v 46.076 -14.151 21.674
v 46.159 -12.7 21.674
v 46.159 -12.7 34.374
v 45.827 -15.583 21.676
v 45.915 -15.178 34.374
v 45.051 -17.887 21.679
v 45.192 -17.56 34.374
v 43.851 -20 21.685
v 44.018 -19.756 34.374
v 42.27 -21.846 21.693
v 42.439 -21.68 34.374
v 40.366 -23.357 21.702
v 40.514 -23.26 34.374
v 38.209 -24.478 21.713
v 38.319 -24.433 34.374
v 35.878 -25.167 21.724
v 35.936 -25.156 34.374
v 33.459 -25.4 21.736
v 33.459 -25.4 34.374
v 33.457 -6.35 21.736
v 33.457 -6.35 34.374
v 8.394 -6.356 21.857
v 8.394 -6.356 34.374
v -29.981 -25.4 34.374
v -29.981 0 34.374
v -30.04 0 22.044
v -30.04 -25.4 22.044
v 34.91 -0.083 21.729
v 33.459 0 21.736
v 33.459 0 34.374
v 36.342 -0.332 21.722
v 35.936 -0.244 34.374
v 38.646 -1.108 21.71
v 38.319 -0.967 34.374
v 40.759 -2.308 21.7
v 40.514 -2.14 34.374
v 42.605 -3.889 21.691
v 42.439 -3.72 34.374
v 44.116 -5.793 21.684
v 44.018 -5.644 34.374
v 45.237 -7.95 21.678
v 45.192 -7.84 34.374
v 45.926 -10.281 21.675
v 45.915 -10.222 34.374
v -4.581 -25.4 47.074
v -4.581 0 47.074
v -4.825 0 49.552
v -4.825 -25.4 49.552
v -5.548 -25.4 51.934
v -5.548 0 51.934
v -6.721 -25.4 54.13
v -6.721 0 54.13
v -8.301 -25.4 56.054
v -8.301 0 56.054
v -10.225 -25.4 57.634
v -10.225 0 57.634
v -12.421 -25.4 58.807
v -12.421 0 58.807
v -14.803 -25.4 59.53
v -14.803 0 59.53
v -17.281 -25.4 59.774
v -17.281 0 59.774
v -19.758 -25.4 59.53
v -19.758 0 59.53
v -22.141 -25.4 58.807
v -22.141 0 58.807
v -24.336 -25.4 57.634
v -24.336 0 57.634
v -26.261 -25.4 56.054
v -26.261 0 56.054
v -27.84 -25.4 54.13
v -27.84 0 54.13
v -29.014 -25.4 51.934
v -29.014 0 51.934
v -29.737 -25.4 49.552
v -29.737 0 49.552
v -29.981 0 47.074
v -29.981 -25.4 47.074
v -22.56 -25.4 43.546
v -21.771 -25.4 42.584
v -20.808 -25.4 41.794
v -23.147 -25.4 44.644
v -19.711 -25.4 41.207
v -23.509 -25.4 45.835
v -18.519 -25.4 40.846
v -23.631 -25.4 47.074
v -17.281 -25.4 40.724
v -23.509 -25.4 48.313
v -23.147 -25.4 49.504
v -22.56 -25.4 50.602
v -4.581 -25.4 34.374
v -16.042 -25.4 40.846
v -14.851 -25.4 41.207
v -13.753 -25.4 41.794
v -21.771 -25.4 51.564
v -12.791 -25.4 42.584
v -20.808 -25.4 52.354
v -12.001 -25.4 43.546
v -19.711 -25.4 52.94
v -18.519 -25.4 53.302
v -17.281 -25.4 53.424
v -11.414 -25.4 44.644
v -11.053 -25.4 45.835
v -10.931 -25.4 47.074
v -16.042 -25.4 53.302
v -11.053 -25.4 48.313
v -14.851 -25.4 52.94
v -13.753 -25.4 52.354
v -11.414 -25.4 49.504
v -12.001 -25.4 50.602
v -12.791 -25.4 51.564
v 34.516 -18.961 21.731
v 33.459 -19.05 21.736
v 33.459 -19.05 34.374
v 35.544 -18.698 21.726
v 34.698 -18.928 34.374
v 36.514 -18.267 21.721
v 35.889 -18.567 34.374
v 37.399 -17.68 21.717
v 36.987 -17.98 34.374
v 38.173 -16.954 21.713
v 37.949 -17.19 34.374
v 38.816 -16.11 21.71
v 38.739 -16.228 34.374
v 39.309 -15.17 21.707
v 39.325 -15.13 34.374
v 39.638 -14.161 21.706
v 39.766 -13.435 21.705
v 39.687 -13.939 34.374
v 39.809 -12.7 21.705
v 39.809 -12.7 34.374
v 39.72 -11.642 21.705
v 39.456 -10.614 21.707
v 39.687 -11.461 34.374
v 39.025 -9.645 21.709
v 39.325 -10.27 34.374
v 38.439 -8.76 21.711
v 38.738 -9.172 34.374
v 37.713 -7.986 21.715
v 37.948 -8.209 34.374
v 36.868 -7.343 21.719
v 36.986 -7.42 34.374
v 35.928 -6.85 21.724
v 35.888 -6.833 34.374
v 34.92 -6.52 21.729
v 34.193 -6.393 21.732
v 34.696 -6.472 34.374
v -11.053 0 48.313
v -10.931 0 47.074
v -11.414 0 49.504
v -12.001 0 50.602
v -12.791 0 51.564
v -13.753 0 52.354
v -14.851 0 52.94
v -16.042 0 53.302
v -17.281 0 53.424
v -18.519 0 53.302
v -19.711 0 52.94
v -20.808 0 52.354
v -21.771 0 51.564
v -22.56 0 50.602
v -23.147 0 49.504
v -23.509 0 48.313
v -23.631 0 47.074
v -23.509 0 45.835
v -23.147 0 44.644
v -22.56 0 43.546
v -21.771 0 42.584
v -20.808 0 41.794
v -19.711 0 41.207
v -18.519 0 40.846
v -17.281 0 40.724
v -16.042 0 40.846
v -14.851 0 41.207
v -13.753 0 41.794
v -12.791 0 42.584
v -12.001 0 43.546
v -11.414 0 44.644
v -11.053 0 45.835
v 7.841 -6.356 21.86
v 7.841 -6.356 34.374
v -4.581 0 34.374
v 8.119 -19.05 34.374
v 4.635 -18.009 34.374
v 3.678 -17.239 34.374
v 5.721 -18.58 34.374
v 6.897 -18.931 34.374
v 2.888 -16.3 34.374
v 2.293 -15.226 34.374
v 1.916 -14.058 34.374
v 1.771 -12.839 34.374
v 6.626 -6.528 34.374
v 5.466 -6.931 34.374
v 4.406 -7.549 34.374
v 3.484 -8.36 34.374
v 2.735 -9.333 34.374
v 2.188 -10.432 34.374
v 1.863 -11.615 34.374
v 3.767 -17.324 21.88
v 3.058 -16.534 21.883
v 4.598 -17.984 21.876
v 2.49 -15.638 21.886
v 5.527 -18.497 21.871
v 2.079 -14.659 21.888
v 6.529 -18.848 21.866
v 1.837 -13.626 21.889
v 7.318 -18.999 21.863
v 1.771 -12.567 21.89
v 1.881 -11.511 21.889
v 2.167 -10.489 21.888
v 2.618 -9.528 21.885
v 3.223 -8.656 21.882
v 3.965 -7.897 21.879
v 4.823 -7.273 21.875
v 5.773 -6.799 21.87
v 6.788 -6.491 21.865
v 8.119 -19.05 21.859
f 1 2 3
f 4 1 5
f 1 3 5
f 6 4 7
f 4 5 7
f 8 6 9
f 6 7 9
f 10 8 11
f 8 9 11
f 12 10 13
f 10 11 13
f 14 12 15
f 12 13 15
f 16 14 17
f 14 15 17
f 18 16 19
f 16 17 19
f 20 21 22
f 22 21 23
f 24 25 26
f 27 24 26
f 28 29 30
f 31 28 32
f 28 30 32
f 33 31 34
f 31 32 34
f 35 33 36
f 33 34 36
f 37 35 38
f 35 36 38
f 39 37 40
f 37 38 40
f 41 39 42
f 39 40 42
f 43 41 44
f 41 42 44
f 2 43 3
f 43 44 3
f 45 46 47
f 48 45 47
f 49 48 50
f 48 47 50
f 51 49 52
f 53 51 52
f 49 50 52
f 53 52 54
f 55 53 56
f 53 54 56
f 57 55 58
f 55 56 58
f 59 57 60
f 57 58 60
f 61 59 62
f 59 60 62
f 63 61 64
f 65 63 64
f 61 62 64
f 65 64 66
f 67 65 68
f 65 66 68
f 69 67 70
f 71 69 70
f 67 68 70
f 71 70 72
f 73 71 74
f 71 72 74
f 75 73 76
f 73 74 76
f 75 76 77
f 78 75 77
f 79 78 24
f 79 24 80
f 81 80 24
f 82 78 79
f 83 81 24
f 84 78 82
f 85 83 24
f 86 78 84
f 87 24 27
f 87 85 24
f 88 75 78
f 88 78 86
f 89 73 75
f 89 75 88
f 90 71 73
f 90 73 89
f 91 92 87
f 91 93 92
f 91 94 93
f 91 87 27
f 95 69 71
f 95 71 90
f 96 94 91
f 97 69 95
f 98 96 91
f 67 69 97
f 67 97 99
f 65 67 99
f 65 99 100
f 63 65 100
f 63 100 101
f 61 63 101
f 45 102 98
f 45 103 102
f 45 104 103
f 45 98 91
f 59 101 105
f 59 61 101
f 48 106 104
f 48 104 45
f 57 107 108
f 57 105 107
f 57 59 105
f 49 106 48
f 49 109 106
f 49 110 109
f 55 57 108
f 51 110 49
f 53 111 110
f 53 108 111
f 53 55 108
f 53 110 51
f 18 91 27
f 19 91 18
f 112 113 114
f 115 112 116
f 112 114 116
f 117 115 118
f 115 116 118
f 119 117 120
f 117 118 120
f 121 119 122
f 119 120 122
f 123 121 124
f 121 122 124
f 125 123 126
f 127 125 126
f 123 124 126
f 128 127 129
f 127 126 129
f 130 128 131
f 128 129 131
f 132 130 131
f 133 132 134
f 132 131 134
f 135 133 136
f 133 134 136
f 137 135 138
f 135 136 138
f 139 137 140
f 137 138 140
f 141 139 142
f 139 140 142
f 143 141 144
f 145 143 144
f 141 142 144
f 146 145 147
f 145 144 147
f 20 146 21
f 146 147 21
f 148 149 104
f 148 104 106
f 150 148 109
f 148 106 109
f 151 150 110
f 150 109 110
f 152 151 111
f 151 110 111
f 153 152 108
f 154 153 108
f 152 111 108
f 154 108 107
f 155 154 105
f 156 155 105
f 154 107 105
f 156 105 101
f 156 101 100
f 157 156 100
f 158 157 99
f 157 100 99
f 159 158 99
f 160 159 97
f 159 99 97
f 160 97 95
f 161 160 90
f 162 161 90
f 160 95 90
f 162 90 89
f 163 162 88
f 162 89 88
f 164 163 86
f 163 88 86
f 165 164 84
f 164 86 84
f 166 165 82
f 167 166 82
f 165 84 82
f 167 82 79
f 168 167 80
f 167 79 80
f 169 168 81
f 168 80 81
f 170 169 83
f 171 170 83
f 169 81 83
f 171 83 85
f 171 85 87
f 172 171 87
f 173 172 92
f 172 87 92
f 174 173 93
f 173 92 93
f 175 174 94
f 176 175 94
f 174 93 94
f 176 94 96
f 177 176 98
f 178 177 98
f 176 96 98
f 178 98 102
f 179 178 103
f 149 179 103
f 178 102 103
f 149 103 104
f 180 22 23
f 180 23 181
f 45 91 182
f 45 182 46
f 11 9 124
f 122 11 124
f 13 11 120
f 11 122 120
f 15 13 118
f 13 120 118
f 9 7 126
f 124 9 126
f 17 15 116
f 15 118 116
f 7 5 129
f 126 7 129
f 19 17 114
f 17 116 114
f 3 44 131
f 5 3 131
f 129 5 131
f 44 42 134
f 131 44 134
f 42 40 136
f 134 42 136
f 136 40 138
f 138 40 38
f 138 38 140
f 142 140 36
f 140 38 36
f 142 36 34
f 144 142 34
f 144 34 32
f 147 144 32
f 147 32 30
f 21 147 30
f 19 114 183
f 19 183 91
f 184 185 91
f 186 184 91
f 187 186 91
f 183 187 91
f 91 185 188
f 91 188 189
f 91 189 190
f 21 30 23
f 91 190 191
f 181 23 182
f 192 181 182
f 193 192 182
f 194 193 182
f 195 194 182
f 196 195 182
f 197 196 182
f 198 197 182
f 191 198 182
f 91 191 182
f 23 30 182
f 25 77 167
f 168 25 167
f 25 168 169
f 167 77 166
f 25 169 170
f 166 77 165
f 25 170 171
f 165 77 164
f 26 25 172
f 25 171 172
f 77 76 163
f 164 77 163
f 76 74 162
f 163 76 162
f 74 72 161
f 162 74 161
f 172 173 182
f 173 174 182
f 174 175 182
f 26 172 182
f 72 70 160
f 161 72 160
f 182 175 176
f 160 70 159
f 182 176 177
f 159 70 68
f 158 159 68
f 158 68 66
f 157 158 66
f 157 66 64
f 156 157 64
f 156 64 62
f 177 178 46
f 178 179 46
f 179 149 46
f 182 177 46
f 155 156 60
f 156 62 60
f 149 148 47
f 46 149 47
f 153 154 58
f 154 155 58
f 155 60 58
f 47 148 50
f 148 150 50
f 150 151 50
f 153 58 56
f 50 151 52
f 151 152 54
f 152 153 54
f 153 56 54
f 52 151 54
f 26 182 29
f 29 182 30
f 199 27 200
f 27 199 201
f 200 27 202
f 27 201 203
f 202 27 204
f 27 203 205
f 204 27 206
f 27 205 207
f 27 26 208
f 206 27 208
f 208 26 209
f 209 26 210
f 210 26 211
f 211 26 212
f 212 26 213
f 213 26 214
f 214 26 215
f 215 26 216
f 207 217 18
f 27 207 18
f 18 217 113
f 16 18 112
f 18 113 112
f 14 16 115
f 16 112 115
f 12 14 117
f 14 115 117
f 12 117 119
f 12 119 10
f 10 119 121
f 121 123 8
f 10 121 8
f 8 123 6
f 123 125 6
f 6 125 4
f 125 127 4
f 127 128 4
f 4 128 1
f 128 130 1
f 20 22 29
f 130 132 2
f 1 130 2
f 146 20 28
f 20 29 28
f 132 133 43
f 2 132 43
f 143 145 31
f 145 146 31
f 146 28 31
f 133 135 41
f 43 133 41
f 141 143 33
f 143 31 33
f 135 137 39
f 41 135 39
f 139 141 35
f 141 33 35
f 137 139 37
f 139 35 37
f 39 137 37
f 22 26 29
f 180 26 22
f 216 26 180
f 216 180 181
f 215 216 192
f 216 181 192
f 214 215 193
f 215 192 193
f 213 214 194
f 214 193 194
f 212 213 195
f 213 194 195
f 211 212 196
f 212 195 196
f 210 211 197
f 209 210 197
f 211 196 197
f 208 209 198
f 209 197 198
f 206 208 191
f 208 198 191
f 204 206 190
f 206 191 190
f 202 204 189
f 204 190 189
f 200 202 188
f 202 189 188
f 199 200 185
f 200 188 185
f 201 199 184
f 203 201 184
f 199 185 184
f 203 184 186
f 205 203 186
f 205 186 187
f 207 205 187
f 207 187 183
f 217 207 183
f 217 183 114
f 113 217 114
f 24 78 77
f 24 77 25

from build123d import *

# Parameters (mm, degrees)
F1_DEPTH = 25.4
F2_R     = 6.3498502592
F3_DEPTH = 25.4
F5_DEPTH = 12.7
F7_DEPTH = 25.4


with BuildPart() as f1:
    # F0 (on Front) → F1 (new body)
    with BuildSketch(Plane.XZ):
        with BuildLine():
            Line((-29.9805339301, 47.0739776071), (-29.9805339301, 34.3739776071))
            Line((-29.9805339301, 34.3739776071), (-30.0404094228, 22.0440076031))
            Line((-30.0404094228, 22.0440076031), (46.1586921323, 21.6739776071))
            Line((46.1586921323, 21.6739776071), (46.1586921323, 34.3739776071))
            Line((46.1586921323, 34.3739776071), (-4.5808334117, 34.3739776071))
            Line((-4.5808334117, 34.3739776071), (-4.5808334117, 47.0739776071))
            ThreePointArc((-4.5808334117, 47.0739776071), (-17.2806836709, 59.7738278663), (-29.9805339301, 47.0739776071))
        make_face()
    extrude(amount=F1_DEPTH)

    # F2 (on face) → F3 (cut)
    with BuildSketch(Plane.XZ.offset(25.4)):
        with Locations((-17.2806836709, 47.0739776071)):
            Circle(F2_R)
    extrude(amount=-F3_DEPTH, mode=Mode.SUBTRACT)

    # F4 (on face) → F5 (cut)
    with BuildSketch(Plane.XY.offset(34.3739776071)):
        with BuildLine():
            ThreePointArc((33.4586921323, 0), (42.4389482533, -3.7197438789), (46.1586921323, -12.7))
            Line((46.1586921323, -12.7), (46.1586921323, 0))
            Line((46.1586921323, 0), (33.4586921323, 0))
        make_face()
        with BuildLine():
            Line((46.1586921323, -25.4), (46.1586921323, -12.7))
            ThreePointArc((46.1586921323, -12.7), (42.4389482533, -21.6802561211), (33.4586921323, -25.4))
            Line((33.4586921323, -25.4), (46.1586921323, -25.4))
        make_face()
    extrude(amount=-F5_DEPTH, mode=Mode.SUBTRACT)

    # F6 (on face) → F7 (cut)
    with BuildSketch(Plane.XY.offset(34.3739776071)):
        with BuildLine():
            Line((8.3943191118, -6.3559641324), (7.8409948456, -6.3560958014))
            ThreePointArc((7.8409948456, -6.3560958014), (1.7706907215, -12.8391192629), (8.1191665883, -19.05))
            ThreePointArc((8.1191665883, -19.05), (12.6092946488, -17.1901280605), (14.4691665883, -12.7))
            ThreePointArc((14.4691665883, -12.7), (12.7055441634, -8.308230341), (8.3943191118, -6.3559641324))
        make_face()
        with BuildLine():
            ThreePointArc((14.4691665883, -12.7), (12.6092946488, -17.1901280605), (8.1191665883, -19.05))
            Line((8.1191665883, -19.05), (33.4586921323, -19.05))
            ThreePointArc((33.4586921323, -19.05), (27.1086921772, -12.7007555222), (33.4571810878, -6.3500001798))
            Line((33.4571810878, -6.3500001798), (8.3943191118, -6.3559641324))
            ThreePointArc((8.3943191118, -6.3559641324), (12.7055441634, -8.308230341), (14.4691665883, -12.7))
        make_face()
        with BuildLine():
            ThreePointArc((33.4571810878, -6.3500001798), (27.1086921772, -12.7007555222), (33.4586921323, -19.05))
            ThreePointArc((33.4586921323, -19.05), (37.9488201928, -17.1901280605), (39.8086921323, -12.7))
            ThreePointArc((39.8086921323, -12.7), (37.9482859261, -8.2093377364), (33.4571810878, -6.3500001798))
        make_face()
    extrude(amount=-F7_DEPTH, mode=Mode.SUBTRACT)


solid = f1.part
